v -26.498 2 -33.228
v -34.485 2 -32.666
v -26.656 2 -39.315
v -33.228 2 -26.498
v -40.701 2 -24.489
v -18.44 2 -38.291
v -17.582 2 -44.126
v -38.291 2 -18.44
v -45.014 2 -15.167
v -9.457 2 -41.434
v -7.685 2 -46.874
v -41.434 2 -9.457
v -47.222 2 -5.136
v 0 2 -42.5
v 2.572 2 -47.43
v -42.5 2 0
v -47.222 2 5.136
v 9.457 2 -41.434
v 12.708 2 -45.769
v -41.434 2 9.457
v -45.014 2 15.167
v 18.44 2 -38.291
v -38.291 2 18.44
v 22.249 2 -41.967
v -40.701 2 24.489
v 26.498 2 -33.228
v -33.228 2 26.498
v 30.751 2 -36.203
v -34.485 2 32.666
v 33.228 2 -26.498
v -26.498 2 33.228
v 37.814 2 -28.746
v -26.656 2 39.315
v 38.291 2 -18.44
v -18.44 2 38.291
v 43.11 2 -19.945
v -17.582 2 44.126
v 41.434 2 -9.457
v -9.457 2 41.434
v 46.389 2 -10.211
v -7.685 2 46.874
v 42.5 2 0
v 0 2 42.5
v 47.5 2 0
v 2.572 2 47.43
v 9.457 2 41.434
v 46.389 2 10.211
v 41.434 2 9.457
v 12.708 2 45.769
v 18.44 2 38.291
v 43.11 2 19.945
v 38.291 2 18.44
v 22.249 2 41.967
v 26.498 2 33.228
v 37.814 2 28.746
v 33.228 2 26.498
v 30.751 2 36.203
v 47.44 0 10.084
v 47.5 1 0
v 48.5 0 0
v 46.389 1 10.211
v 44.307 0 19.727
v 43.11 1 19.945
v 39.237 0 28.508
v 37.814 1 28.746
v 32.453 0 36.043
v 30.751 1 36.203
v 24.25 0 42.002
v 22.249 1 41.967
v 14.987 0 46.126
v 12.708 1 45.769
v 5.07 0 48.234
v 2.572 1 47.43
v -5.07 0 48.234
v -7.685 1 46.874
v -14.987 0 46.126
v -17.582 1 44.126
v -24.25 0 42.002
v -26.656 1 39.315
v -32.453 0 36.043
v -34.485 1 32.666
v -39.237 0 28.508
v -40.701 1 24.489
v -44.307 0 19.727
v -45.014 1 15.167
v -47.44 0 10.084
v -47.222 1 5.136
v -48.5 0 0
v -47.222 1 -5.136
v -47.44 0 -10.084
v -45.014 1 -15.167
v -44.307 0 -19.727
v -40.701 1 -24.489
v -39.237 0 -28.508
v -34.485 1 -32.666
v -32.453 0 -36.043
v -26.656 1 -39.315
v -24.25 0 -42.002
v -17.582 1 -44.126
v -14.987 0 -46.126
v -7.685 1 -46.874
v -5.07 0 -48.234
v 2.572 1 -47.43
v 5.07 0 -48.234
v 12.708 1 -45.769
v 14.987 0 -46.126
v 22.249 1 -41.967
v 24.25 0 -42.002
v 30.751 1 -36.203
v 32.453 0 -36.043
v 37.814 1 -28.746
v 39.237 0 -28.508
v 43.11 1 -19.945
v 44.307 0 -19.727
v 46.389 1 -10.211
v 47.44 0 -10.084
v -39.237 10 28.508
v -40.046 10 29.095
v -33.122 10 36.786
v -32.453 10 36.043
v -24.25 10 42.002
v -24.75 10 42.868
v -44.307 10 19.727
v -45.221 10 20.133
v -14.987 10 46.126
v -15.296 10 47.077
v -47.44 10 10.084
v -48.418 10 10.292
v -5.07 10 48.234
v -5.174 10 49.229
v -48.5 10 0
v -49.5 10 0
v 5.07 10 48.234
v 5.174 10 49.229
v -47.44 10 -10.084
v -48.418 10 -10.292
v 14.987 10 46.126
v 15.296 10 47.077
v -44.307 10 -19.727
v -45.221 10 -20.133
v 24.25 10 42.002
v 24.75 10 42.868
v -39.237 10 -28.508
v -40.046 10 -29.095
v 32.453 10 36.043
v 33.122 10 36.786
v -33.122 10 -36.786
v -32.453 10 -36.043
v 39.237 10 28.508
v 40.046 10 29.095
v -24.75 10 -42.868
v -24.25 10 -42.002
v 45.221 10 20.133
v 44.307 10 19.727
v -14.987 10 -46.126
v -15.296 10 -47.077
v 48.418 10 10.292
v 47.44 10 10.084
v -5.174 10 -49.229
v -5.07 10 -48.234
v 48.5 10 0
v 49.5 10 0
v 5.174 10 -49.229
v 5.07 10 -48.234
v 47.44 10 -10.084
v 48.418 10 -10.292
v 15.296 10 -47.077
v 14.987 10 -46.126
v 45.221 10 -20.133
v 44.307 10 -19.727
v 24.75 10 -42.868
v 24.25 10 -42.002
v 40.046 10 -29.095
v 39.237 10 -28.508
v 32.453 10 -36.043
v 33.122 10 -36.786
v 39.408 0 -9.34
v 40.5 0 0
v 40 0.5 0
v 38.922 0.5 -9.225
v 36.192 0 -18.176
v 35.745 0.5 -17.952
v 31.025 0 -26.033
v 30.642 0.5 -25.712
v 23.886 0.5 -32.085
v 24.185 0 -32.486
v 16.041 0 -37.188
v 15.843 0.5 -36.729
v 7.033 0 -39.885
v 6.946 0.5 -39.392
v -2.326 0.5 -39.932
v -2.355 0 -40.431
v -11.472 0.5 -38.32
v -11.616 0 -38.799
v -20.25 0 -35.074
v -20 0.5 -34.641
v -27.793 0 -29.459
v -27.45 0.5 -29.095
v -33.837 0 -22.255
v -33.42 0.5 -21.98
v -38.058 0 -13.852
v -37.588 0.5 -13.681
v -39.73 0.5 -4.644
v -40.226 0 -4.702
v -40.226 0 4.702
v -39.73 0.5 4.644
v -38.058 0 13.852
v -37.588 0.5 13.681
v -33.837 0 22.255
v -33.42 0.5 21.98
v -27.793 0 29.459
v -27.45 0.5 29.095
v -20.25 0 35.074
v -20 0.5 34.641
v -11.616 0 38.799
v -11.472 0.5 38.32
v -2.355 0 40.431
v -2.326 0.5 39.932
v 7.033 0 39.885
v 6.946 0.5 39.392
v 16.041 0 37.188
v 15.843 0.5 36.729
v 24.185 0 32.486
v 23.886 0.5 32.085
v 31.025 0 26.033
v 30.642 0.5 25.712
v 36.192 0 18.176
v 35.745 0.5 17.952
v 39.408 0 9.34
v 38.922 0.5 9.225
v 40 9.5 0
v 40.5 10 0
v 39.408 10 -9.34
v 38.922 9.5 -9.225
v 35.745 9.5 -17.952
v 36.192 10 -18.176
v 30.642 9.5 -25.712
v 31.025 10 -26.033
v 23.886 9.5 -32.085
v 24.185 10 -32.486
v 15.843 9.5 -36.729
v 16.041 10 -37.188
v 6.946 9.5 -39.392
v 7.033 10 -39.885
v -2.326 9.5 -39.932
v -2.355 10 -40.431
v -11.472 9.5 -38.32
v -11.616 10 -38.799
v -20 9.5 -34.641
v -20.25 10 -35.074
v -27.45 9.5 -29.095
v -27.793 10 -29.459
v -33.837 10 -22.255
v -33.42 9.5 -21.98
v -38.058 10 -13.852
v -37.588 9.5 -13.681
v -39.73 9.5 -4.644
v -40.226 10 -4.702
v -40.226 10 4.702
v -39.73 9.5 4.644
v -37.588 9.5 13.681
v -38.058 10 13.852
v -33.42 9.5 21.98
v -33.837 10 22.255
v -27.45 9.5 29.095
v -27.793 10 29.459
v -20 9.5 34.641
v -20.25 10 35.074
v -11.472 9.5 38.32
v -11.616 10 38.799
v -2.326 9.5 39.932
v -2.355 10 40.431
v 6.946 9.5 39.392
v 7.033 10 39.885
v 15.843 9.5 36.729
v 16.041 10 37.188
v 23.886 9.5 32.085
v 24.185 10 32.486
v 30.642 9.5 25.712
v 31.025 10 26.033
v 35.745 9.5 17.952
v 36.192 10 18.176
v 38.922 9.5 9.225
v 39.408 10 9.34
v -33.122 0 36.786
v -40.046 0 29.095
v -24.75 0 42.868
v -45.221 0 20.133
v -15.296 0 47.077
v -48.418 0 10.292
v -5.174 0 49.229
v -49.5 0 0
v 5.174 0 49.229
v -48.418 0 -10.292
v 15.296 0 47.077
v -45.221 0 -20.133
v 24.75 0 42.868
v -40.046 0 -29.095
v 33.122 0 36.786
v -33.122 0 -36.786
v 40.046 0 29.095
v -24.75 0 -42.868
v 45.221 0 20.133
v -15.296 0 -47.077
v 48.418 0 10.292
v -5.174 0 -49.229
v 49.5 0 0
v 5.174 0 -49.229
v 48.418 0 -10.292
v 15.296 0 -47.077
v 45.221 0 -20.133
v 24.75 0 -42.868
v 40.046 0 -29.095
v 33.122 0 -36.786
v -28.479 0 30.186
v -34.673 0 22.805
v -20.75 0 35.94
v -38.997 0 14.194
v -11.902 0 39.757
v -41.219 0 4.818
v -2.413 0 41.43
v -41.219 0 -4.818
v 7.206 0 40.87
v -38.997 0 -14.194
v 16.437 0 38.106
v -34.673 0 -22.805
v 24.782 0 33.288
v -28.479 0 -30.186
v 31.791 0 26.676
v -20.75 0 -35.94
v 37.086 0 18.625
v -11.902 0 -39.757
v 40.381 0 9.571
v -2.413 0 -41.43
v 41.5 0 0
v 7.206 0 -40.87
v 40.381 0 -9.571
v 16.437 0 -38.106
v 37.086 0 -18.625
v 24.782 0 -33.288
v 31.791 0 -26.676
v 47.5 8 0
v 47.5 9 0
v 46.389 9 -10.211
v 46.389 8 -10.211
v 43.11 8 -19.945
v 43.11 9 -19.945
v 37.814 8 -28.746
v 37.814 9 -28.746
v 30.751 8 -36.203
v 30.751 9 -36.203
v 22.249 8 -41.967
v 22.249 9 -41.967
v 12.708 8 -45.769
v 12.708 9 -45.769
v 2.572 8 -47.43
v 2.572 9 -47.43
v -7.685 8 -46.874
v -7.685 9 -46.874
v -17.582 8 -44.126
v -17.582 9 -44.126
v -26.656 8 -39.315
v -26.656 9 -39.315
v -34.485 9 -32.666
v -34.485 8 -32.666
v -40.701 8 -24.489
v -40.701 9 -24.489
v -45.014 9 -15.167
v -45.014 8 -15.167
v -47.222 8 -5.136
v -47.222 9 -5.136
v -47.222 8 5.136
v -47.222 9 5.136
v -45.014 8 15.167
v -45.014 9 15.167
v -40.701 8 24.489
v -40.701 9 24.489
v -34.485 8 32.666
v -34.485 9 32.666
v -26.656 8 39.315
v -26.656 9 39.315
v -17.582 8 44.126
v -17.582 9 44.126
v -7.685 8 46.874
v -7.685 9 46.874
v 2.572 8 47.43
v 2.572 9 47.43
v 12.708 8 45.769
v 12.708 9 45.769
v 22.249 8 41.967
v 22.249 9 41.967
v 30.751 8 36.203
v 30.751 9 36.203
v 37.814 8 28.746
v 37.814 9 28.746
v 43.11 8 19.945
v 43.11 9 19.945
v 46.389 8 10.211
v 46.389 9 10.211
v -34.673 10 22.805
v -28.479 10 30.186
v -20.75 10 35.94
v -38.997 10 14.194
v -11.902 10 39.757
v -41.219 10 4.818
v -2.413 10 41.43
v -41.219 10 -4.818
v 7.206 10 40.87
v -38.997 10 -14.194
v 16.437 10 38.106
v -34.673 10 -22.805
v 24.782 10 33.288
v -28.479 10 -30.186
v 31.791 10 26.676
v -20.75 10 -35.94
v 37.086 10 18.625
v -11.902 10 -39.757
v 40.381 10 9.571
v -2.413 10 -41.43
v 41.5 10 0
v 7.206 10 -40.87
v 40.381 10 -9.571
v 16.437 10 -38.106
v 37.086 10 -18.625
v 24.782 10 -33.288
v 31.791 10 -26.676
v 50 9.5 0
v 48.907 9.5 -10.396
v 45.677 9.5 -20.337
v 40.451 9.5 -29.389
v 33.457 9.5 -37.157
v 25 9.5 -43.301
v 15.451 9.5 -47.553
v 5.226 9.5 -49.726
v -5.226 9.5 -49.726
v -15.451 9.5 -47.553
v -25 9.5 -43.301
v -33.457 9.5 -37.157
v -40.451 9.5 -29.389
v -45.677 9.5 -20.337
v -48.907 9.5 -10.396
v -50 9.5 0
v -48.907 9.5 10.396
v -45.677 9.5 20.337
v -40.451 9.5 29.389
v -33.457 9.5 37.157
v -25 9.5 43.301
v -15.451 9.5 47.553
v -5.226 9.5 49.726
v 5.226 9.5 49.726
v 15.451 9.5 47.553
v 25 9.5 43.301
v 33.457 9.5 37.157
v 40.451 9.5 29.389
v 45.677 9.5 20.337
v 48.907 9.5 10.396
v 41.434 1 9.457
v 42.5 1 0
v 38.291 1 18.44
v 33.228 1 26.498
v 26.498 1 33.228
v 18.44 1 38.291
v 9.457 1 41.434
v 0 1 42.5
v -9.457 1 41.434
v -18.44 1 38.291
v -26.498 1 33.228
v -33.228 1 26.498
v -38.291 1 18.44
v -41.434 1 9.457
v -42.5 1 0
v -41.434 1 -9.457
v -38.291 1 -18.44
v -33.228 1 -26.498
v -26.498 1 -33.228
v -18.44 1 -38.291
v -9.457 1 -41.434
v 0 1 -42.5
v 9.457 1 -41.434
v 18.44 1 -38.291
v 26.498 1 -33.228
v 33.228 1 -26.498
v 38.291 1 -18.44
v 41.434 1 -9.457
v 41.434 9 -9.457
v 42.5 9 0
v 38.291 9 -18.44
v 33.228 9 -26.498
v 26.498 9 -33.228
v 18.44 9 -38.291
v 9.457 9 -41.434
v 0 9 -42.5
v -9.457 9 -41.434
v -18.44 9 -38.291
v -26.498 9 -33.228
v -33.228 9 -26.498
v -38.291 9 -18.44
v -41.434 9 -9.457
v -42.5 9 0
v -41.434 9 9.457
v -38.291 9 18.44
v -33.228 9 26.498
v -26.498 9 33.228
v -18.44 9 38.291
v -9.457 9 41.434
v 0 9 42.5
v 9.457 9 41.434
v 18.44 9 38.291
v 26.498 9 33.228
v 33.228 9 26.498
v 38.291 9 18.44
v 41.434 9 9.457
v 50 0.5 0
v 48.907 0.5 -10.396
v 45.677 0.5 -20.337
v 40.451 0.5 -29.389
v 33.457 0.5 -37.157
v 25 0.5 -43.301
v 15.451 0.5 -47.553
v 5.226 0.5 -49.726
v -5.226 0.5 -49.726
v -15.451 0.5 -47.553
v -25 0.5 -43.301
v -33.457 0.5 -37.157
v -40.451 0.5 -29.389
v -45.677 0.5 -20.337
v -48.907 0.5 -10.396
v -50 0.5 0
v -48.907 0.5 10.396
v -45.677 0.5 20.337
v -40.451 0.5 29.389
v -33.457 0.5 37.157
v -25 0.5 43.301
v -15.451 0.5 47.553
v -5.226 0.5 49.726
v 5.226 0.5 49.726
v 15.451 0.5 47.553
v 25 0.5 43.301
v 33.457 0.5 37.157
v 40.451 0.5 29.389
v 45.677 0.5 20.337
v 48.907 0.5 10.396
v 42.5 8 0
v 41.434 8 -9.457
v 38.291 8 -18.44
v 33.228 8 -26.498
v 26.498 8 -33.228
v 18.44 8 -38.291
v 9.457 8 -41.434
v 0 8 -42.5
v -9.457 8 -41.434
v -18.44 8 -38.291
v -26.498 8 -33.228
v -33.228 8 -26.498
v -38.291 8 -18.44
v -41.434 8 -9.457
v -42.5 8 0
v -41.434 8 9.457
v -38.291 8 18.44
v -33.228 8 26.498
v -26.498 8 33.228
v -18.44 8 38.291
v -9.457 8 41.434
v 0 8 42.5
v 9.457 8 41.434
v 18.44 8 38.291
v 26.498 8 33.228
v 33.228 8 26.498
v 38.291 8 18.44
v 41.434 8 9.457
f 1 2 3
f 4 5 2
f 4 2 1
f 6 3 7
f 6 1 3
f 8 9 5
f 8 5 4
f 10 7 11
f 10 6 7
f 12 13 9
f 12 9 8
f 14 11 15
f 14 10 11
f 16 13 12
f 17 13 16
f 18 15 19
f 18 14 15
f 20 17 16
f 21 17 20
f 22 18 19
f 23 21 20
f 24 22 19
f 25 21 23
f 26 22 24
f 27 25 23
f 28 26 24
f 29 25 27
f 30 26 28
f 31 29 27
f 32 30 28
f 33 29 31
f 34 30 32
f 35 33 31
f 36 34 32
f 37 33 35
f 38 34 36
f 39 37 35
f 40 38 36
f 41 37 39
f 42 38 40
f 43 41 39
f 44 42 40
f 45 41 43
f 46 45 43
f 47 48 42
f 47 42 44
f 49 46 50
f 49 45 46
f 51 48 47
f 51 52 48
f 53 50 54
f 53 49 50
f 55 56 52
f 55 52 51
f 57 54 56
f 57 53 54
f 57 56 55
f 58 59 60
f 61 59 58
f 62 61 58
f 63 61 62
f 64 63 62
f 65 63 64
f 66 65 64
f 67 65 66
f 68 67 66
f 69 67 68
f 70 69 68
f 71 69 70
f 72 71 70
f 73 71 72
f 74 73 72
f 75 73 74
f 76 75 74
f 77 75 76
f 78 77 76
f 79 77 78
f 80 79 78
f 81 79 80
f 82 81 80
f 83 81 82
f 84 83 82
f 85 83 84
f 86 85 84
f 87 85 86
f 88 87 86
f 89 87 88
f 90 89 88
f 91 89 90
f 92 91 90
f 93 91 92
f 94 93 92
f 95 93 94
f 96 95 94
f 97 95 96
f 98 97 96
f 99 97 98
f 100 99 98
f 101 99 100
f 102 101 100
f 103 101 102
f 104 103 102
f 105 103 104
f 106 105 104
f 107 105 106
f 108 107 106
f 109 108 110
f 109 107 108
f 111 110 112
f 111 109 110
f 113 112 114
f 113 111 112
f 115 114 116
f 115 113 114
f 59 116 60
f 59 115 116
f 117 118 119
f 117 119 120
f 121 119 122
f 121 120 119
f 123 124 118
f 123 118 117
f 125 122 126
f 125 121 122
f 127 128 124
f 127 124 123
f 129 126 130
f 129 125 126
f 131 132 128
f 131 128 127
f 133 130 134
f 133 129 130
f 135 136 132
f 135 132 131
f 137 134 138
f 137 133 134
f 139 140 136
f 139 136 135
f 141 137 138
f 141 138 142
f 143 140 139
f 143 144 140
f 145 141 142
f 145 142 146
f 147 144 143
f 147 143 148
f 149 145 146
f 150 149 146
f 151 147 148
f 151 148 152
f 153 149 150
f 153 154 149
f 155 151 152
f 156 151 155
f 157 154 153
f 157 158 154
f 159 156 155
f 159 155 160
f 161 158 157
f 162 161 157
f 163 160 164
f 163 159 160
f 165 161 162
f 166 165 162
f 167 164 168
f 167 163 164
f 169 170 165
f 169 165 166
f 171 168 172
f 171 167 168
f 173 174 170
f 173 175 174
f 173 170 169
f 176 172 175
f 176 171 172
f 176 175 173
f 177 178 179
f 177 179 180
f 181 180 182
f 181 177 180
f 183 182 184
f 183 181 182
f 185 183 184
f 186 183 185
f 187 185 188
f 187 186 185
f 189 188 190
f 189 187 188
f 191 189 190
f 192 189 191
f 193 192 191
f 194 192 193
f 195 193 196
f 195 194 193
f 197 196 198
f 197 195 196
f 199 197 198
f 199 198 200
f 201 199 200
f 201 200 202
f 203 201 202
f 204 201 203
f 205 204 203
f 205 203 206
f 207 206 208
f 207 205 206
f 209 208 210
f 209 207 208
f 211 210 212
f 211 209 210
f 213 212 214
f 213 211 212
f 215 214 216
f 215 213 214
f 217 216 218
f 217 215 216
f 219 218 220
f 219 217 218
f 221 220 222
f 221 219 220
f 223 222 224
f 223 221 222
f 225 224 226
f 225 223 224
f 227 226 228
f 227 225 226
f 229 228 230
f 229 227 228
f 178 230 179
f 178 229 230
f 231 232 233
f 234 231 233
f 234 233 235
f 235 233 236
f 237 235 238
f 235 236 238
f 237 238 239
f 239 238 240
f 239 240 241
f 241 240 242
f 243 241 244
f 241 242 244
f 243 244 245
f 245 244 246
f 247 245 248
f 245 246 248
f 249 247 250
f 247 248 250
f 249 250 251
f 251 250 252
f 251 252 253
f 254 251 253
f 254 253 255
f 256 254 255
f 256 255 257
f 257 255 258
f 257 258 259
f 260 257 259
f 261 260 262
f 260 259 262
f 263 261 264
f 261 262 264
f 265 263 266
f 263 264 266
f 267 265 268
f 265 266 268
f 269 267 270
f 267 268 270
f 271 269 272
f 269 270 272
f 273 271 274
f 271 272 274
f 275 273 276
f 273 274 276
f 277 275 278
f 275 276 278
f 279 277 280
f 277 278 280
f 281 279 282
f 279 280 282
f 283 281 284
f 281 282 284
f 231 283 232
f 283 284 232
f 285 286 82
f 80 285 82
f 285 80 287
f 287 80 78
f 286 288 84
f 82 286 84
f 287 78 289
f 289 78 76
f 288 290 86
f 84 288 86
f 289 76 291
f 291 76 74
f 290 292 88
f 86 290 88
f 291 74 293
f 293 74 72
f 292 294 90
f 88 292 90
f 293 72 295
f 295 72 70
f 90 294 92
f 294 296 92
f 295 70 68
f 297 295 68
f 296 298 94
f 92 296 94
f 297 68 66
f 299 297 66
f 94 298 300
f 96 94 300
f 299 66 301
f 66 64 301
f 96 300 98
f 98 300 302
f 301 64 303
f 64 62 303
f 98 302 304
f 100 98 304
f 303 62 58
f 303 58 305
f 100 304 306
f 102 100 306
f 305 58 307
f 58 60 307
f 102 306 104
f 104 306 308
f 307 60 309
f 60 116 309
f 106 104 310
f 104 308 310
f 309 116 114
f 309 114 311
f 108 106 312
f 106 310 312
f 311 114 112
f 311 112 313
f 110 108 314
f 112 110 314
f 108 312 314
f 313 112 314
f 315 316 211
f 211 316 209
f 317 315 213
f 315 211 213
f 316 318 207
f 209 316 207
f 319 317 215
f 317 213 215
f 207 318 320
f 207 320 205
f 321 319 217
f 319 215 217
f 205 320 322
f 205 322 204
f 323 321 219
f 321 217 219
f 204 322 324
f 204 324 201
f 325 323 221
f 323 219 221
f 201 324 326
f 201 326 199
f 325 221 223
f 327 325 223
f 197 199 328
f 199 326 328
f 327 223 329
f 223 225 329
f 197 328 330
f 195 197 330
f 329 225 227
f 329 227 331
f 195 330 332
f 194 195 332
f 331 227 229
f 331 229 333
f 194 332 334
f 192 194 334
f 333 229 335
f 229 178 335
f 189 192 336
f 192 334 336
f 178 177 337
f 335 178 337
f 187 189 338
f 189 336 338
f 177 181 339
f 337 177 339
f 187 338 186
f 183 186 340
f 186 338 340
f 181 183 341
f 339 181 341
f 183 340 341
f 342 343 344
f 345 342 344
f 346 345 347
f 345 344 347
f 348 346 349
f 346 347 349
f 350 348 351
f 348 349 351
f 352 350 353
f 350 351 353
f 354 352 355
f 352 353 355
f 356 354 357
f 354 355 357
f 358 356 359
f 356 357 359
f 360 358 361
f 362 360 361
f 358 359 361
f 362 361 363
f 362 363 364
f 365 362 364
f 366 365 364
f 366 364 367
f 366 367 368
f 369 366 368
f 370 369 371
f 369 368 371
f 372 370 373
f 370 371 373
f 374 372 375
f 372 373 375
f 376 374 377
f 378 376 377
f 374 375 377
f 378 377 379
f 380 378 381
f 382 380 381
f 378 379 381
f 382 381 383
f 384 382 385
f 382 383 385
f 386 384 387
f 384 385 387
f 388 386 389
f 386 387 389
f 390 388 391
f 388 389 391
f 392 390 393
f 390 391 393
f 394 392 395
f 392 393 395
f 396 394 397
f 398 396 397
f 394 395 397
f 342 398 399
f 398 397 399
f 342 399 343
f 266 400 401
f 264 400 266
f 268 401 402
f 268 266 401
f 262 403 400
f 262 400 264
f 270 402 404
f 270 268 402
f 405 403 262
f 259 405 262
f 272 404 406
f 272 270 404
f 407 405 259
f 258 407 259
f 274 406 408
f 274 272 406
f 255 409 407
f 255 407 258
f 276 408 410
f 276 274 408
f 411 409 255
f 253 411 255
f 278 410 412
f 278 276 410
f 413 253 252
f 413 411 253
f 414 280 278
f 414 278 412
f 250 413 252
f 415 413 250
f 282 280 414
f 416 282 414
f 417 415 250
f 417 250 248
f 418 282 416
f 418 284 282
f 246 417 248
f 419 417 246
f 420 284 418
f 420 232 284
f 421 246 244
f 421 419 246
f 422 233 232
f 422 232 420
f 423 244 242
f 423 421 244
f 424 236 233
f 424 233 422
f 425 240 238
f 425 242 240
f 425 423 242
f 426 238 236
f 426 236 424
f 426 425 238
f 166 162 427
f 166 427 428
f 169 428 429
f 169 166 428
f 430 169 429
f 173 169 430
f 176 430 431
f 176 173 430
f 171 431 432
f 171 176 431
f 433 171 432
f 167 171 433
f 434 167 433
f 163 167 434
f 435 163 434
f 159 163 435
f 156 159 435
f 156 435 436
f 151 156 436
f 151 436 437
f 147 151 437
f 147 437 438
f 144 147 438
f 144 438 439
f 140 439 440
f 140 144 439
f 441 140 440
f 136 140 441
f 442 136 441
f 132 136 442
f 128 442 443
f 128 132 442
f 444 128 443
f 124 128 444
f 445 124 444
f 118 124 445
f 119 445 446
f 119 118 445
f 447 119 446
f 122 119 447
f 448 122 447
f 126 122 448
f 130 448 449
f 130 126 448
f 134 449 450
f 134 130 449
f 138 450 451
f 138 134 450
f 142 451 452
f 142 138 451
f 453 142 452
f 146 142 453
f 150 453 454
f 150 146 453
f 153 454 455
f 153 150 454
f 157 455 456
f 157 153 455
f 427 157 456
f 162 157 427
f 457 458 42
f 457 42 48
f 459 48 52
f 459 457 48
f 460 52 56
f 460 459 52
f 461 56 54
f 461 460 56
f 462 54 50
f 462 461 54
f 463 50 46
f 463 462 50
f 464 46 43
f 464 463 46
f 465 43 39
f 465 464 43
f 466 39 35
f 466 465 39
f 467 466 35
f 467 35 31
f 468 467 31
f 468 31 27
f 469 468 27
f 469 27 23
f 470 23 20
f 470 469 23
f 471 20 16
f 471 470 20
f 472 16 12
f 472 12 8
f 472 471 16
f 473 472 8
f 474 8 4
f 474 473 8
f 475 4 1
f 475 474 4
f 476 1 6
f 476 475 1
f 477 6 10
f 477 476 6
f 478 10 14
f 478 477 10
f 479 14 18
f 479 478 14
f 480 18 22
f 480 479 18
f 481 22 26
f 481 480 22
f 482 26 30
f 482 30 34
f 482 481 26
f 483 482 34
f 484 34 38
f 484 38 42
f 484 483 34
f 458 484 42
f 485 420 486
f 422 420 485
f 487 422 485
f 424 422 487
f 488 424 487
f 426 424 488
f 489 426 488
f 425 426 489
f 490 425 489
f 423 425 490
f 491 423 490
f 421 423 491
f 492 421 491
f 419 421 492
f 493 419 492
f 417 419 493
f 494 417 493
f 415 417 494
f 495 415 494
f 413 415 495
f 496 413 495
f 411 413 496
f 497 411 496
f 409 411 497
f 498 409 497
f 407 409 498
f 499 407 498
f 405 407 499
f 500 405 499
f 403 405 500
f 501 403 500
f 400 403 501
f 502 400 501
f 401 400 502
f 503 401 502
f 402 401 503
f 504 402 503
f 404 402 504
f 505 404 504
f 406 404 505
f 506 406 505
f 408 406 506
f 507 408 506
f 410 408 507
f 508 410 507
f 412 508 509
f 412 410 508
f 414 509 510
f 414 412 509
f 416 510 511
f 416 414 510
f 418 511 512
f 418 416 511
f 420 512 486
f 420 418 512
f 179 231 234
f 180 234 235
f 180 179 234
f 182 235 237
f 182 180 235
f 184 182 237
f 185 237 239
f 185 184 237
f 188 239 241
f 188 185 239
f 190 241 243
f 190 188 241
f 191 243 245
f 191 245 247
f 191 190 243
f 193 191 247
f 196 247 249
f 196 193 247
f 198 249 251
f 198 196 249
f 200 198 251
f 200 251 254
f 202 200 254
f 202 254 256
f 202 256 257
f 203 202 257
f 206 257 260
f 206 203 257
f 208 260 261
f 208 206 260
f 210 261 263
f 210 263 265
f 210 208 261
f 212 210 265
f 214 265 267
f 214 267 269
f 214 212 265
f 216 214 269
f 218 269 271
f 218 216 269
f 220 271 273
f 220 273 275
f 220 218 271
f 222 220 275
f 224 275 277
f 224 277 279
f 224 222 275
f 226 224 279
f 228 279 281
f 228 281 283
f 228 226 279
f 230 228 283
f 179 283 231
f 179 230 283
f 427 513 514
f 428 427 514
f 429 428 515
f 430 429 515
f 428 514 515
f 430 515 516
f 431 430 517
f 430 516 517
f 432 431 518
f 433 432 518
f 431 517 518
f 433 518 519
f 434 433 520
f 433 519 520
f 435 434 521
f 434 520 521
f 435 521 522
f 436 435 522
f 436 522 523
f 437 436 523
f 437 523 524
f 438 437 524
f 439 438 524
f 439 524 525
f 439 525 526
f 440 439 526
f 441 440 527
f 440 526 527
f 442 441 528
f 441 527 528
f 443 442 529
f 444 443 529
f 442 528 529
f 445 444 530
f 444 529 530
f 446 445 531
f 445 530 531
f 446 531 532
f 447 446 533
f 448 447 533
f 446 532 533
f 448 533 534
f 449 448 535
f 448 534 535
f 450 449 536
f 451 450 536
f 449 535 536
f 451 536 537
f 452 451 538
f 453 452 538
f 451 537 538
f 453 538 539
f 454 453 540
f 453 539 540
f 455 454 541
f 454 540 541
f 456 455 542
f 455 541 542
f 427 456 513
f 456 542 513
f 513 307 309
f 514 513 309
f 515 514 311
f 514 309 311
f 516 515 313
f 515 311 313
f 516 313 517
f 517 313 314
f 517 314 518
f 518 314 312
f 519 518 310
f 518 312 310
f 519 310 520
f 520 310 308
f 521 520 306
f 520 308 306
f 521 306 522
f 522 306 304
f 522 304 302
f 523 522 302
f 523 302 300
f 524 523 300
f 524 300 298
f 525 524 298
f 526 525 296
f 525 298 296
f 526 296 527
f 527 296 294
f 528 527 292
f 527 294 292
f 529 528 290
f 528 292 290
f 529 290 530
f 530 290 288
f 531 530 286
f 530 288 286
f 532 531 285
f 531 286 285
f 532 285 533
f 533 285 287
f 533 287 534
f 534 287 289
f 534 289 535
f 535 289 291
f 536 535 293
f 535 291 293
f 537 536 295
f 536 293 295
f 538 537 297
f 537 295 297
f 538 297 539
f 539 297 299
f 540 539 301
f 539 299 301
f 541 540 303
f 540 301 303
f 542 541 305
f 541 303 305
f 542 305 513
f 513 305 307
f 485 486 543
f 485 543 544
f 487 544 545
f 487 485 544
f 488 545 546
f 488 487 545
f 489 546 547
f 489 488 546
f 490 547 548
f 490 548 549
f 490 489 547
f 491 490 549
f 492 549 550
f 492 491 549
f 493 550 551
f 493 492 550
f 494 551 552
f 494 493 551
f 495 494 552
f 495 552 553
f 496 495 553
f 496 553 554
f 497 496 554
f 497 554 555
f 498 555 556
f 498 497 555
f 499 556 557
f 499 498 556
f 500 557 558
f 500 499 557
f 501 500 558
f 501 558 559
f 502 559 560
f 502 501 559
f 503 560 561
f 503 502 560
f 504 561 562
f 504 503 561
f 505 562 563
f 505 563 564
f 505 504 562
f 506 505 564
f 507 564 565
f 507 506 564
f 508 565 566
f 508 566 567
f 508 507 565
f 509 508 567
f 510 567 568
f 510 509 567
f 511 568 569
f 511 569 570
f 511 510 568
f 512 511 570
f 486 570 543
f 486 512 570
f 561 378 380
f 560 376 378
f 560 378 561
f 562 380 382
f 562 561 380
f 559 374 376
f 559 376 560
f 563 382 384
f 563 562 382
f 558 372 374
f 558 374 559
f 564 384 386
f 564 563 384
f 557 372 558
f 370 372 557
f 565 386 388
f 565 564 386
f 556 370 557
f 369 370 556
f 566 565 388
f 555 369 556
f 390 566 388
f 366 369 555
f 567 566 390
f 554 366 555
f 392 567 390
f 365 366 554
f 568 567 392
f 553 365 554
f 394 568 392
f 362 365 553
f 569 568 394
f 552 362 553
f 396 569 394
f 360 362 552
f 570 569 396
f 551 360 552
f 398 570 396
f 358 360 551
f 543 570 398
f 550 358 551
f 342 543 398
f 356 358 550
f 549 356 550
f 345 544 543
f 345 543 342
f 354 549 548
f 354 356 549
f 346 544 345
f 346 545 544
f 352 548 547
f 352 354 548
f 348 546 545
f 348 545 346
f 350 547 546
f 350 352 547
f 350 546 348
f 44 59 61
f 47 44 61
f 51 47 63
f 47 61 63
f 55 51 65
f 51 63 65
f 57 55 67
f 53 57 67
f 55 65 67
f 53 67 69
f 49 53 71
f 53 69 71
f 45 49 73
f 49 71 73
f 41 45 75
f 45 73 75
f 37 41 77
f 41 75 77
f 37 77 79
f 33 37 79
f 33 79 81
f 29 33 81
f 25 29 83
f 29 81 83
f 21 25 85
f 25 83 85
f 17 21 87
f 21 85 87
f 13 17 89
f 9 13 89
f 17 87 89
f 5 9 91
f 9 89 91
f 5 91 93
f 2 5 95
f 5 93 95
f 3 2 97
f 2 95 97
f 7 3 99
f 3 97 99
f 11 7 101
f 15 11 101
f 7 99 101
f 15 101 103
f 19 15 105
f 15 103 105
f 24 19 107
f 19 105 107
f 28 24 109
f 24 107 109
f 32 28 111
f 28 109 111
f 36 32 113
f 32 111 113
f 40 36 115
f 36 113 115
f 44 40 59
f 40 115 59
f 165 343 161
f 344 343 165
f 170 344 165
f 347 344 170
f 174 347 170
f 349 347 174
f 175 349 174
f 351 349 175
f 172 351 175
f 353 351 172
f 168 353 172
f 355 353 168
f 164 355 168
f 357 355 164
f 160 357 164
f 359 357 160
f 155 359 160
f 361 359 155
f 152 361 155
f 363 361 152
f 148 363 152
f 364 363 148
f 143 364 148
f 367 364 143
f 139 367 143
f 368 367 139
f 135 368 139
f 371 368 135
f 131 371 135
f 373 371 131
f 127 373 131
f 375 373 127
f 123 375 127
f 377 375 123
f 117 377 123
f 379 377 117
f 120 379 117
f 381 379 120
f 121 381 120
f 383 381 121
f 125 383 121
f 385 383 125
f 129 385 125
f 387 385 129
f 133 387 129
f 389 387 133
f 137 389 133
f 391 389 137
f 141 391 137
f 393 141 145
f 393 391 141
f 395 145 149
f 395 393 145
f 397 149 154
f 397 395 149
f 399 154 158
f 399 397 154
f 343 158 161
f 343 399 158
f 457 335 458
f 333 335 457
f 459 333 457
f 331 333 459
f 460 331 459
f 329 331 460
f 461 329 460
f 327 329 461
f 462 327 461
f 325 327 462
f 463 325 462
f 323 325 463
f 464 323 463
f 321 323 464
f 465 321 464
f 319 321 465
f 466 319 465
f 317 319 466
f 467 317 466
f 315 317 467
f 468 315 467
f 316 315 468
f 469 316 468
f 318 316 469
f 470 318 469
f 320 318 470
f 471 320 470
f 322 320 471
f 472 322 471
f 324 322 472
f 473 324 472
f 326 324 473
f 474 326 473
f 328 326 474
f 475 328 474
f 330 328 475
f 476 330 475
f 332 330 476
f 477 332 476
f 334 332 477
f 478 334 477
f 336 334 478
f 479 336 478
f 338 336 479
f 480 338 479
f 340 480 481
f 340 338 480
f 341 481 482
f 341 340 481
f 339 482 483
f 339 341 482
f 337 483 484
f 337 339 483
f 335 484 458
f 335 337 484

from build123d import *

# Parameters (mm, degrees)
SKETCH1_R           = 50
SKETCH1_R_2         = 40
BOSS_EXTRUDE1_DEPTH = 10
CHAMFER1_SIZE       = 0.5
SKETCH2_R           = 47.5
SKETCH2_R_2         = 42.5
CUT_EXTRUDE1_DEPTH  = 2
CHAMFER2_SIZE       = 1
SKETCH3_R           = 47.5
SKETCH3_R_2         = 42.5
CUT_EXTRUDE2_DEPTH  = 2
CHAMFER3_SIZE       = 1


with BuildPart() as part:
    # Sketch1 → Boss-Extrude1 (new body)
    with BuildSketch(Plane(origin=(0, 0, 0), x_dir=(1, 0, 0), z_dir=(0, 1, 0))):
        Circle(SKETCH1_R)
        Circle(SKETCH1_R_2, mode=Mode.SUBTRACT)
    extrude(amount=BOSS_EXTRUDE1_DEPTH)

    # Chamfer1
    chamfer1_edges = [part.edges().sort_by_distance(p)[0] for p in [
        (-50, 0, 0),
        (-50, 10, 0),
        (-40, 0, 0),
        (-40, 10, 0),
    ]]
    chamfer(chamfer1_edges, length=CHAMFER1_SIZE)

    # Sketch2 → Cut-Extrude1 (cut)
    with BuildSketch(Plane(origin=(0, 10, 0), x_dir=(1, 0, 0), z_dir=(0, 1, 0))):
        Circle(SKETCH2_R)
        Circle(SKETCH2_R_2, mode=Mode.SUBTRACT)
    extrude(amount=-CUT_EXTRUDE1_DEPTH, mode=Mode.SUBTRACT)

    # Chamfer2
    chamfer2_edges = [part.edges().sort_by_distance(p)[0] for p in [
        (-47.5, 10, 0),
        (-42.5, 10, 0),
    ]]
    chamfer(chamfer2_edges, length=CHAMFER2_SIZE)

    # Sketch3 → Cut-Extrude2 (cut)
    with BuildSketch(Plane.XZ):
        Circle(SKETCH3_R)
        Circle(SKETCH3_R_2, mode=Mode.SUBTRACT)
    extrude(amount=-CUT_EXTRUDE2_DEPTH, mode=Mode.SUBTRACT)

    # Chamfer3
    chamfer3_edges = [part.edges().sort_by_distance(p)[0] for p in [
        (-47.5, 0, 0),
        (-42.5, 0, 0),
    ]]
    chamfer(chamfer3_edges, length=CHAMFER3_SIZE)


solid = part.part
